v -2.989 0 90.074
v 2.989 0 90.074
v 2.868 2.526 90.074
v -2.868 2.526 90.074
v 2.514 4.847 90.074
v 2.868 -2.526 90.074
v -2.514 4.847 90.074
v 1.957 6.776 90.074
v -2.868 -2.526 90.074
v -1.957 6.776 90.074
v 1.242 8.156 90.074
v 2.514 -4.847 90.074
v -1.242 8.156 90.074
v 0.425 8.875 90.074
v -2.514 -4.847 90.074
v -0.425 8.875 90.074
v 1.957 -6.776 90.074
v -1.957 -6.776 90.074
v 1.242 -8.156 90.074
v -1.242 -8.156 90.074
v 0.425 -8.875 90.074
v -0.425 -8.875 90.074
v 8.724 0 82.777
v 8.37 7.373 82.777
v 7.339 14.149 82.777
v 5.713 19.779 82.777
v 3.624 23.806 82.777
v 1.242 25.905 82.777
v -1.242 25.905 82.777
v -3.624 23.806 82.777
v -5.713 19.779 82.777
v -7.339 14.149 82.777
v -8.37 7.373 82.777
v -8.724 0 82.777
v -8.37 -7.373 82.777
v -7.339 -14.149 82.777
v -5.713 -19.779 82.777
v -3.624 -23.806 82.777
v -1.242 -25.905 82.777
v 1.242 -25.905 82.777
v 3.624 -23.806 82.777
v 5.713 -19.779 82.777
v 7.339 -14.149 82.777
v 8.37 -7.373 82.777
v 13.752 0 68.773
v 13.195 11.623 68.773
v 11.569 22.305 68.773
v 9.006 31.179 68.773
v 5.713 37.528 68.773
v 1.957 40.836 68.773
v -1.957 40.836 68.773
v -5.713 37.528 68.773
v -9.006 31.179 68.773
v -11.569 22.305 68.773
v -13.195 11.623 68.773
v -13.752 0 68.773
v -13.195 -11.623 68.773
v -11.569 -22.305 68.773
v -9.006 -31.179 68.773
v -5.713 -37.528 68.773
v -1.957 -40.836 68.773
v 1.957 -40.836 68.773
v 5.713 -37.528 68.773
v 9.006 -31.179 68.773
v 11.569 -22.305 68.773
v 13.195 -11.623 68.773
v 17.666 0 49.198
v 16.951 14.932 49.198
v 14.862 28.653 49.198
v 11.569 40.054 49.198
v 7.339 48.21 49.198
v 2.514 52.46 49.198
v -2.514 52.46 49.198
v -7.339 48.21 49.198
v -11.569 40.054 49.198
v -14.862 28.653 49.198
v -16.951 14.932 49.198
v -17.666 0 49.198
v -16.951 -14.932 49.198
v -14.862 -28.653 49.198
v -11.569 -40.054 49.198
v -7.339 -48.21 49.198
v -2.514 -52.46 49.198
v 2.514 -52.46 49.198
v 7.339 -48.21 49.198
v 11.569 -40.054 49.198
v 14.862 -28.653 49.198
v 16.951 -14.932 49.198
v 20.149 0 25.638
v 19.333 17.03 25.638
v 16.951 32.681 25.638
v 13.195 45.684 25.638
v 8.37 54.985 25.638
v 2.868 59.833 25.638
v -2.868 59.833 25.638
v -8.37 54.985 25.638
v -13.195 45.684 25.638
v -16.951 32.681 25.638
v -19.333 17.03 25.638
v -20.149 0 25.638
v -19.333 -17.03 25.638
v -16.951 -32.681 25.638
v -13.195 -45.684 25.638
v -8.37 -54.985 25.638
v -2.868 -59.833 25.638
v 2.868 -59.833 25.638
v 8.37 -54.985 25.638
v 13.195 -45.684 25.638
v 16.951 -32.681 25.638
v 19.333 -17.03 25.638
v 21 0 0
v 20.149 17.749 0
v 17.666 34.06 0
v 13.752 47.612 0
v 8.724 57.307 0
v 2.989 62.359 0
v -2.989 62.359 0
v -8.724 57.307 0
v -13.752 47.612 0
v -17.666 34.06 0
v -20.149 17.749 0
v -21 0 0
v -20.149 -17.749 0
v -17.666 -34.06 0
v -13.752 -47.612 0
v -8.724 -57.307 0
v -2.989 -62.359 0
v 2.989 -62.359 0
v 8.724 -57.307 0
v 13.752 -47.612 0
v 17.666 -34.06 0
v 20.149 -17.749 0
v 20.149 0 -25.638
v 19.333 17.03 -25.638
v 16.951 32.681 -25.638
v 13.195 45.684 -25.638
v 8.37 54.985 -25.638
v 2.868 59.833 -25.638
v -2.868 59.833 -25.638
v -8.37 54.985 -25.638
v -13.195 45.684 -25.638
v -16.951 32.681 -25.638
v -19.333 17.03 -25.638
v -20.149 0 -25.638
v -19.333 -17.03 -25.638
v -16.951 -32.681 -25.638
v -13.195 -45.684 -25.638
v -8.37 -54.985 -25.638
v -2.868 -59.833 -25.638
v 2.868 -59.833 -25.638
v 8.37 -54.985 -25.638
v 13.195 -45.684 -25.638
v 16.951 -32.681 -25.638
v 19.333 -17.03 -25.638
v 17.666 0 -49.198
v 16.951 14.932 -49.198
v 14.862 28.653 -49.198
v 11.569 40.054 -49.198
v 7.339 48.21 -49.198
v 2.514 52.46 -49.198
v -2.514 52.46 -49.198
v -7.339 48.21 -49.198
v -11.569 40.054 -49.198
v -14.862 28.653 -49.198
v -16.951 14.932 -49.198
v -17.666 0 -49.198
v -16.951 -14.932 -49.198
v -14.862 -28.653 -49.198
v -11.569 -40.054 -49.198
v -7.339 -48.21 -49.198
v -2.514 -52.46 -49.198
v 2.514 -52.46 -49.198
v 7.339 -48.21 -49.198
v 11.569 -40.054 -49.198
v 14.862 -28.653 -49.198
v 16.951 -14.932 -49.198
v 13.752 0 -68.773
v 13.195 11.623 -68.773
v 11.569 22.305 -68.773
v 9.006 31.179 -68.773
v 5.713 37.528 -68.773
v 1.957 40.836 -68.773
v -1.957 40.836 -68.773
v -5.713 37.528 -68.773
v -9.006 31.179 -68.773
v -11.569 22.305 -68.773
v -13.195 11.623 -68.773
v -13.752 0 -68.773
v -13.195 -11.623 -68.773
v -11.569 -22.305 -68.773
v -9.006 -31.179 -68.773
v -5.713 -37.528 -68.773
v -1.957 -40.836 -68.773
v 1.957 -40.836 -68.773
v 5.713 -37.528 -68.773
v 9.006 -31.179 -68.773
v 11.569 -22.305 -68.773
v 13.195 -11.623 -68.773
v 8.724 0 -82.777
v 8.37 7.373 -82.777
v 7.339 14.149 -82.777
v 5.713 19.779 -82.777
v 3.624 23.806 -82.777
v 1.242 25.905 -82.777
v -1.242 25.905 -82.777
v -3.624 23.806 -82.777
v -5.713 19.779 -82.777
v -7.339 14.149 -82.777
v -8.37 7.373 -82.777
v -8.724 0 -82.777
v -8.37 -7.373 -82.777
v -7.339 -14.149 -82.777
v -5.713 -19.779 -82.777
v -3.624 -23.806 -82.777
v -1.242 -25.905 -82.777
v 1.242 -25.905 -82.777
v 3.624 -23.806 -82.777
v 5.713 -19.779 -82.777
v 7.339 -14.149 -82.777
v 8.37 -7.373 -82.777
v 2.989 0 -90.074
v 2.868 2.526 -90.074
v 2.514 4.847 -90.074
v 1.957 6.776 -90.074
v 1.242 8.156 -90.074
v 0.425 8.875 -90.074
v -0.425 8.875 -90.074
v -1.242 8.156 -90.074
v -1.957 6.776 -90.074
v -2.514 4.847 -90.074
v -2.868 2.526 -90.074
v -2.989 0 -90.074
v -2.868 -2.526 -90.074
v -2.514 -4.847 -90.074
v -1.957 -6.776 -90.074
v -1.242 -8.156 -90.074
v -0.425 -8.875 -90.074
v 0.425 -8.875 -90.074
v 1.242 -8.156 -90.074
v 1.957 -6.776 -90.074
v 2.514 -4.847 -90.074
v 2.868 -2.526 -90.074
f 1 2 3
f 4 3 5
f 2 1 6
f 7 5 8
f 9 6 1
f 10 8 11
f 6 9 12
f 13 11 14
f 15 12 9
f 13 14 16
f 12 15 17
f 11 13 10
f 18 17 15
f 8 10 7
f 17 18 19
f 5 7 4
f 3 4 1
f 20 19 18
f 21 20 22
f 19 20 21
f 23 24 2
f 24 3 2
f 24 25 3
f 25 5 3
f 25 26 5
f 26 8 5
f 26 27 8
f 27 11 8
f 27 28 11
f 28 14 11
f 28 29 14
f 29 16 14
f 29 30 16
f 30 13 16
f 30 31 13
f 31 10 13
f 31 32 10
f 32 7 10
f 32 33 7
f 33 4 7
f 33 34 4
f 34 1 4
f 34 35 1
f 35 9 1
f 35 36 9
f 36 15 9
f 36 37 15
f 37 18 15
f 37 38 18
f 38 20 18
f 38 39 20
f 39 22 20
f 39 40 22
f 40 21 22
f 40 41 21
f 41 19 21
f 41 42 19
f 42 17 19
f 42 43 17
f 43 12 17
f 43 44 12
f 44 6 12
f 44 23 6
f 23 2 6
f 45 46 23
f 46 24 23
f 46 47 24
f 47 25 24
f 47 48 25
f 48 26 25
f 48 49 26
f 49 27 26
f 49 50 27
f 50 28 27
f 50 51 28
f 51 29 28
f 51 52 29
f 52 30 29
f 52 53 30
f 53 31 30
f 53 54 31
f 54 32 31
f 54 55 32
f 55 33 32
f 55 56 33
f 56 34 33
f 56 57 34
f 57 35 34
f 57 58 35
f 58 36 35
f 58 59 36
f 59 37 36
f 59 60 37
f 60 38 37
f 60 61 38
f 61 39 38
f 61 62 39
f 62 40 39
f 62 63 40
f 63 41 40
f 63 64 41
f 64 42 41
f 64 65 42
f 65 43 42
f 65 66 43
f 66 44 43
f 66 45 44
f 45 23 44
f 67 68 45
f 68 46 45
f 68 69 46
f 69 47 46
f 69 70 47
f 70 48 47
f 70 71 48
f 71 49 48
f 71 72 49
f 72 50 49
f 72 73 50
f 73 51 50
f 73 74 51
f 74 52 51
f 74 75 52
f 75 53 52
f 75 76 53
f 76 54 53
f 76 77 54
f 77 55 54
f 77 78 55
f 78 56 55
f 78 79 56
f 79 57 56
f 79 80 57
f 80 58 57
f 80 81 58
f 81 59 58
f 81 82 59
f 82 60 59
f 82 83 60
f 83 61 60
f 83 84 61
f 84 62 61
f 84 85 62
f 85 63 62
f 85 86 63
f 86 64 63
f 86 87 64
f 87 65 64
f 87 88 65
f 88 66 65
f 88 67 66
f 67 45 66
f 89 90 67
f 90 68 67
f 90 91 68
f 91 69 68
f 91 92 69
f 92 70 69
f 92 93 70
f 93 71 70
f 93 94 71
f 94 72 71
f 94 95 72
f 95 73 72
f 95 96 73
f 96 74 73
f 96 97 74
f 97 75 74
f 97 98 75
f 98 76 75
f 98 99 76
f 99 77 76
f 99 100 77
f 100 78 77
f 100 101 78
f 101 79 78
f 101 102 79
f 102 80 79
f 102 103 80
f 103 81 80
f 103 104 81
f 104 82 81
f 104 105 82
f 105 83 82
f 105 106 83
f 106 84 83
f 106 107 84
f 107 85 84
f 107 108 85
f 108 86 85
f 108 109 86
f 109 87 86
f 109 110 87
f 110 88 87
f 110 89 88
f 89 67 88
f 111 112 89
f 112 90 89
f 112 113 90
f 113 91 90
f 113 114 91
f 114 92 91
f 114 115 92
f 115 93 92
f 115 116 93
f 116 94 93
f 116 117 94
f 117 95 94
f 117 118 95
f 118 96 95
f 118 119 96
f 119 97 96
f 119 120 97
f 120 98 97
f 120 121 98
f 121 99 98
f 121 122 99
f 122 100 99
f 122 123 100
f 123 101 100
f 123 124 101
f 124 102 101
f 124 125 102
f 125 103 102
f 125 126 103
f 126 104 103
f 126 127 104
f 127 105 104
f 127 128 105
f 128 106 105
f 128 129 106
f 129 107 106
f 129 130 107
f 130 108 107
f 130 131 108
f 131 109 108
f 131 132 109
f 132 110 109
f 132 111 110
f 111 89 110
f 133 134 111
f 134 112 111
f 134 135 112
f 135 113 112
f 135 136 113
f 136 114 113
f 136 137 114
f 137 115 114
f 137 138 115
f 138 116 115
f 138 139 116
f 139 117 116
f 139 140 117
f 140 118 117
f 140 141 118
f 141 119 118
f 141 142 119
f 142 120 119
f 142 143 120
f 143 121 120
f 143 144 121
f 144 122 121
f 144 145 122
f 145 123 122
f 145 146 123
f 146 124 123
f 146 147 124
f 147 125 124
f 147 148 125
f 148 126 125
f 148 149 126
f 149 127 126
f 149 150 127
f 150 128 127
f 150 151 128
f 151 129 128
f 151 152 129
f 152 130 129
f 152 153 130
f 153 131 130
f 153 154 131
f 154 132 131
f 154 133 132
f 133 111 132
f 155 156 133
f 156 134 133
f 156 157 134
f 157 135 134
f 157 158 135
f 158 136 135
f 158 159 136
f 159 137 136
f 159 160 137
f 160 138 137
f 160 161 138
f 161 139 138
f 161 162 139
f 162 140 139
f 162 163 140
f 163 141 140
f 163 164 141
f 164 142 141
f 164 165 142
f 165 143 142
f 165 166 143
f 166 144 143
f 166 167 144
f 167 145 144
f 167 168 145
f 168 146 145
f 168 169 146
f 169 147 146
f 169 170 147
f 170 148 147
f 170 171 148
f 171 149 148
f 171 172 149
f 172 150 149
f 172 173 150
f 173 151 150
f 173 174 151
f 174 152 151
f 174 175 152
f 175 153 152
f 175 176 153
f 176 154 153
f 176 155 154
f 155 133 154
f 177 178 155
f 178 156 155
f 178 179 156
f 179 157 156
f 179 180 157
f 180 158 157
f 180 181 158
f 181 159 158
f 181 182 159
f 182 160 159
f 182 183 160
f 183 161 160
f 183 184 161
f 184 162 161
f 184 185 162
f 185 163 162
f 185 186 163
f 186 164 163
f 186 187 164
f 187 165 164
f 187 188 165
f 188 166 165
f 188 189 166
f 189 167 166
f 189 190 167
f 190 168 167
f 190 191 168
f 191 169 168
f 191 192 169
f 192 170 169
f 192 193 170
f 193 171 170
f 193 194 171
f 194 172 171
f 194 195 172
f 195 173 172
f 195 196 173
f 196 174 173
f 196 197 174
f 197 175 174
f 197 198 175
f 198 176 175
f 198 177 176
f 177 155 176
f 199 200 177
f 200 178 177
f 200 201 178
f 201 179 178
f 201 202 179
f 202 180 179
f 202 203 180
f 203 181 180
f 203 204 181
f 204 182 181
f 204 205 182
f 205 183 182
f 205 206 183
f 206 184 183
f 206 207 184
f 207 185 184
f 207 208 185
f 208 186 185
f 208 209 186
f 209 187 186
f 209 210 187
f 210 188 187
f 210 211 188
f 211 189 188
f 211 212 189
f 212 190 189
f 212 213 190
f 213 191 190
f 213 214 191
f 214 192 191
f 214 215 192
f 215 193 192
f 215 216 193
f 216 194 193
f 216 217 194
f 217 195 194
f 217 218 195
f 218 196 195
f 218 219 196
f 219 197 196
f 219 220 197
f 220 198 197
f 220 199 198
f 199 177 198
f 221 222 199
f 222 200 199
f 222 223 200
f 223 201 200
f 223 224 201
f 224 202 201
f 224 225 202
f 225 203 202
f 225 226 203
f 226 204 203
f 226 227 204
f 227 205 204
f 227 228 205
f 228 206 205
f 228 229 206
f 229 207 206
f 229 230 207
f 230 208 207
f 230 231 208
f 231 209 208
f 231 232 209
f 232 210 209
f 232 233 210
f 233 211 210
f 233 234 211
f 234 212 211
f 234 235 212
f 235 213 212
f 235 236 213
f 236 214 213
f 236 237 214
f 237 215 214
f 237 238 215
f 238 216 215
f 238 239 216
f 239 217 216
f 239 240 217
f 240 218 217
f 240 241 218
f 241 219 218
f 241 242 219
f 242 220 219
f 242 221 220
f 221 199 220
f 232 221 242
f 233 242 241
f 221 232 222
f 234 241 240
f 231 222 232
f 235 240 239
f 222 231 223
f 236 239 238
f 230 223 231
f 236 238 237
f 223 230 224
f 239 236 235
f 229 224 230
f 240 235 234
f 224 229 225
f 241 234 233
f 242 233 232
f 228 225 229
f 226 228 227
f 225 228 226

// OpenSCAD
// Generated by SolidPython 1.0.1 on 2020-07-29 00:46:45


scale(v = [3, 9, 13]) {
	sphere(r = 7);
}
/***********************************************
*********      SolidPython code:      **********
************************************************
 
# import packages: SolidPython
from solid import *
from solid.utils import *
from itertools import chain, combinations, permutations


class Resize:

    def __init__(self, scad_file):
        self.scad_file = scad_file
        #self.scad_file = import_scad(scad_file)
        # cone/cylinder param:
        self.r1 = 0
        self.r2 = 0
        self.h = 0
        # rectangular prism param:
        self.w = 0
        self.l = 0
        # ellipse param:
        self.r = 0

    # import OpenScad code (file name corresponds to shape)


    # classify shape + parameters
    def assign(self, param1, param2, param3):
        if self.scad_file == 'cone.scad':
            self.r1 = param1
            self.r2 = param2
            self.h = param3
        elif self.scad_file == 'cylinder.scad':
            self.r1 = param1
            self.r2 = param2
            self.h = param3
        elif self.scad_file == 'rectangularPrism.scad':
            self.h = param1
            self.l = param2
            self.w = param3
        else:
            self.r = param1
            self.h = param2

    # resize parameters
    def iterate(self):
        x = range(3, 20, 2)
        i = 1
        if self.scad_file == 'cone.scad':
            tempList = list(permutations(x, 2))
            for temp in tempList:
                param1 = temp[0]
                param2 = temp[1]
                filepath = 'produced_scad_files/' + 'cone' + str(param1) + '_' + str(param2) + '_' + '.scad'
                scad_render_to_file(cylinder(h=param1, r1=param2, r2=0), filepath)

        elif self.scad_file == 'cylinder.scad':
            tempList = list(permutations(x, 3))
            for temp in tempList:
                param1 = temp[0]
                param2 = temp[1]
                filepath = 'produced_scad_files/' + 'cylinder' + str(param1) + '_' + str(param2) + '_' + '.scad'
                scad_render_to_file(cylinder(h=param1, r1=param2, r2=param2), filepath)

        elif self.scad_file == 'rectangularPrism.scad':
            tempList = list(permutations(x, 3))
            for temp in tempList:
                param1 = temp[0]
                param2 = temp[1]
                param3 = temp[2]
                filepath = 'produced_scad_files/' + 'rectangularPrism' + str(param1) + '_' + str(param2) + '_' + str(
                    param3) + '.scad'
                scad_render_to_file(cube(size=(param1, param2, param3)), filepath)

        elif self.scad_file == 'ellipse.scad':
            tempList = list(permutations(x, 4))
            for temp in tempList:
                param1 = temp[0]
                param2 = temp[1]
                param3 = temp[2]
                param4 = temp[3]
                filepath = 'produced_scad_files/' + 'ellipse' + str(param1) + '_' + str(param2) + '_' + str(param3) + '_' + str(param4) + '.scad'
                scad_render_to_file(scale([param1, param2, param3])(sphere(r=param4)), filepath)

    def render_to_scadfile(self):
        scad_render_to_file(scad, 'example.scad') 
 
************************************************/
